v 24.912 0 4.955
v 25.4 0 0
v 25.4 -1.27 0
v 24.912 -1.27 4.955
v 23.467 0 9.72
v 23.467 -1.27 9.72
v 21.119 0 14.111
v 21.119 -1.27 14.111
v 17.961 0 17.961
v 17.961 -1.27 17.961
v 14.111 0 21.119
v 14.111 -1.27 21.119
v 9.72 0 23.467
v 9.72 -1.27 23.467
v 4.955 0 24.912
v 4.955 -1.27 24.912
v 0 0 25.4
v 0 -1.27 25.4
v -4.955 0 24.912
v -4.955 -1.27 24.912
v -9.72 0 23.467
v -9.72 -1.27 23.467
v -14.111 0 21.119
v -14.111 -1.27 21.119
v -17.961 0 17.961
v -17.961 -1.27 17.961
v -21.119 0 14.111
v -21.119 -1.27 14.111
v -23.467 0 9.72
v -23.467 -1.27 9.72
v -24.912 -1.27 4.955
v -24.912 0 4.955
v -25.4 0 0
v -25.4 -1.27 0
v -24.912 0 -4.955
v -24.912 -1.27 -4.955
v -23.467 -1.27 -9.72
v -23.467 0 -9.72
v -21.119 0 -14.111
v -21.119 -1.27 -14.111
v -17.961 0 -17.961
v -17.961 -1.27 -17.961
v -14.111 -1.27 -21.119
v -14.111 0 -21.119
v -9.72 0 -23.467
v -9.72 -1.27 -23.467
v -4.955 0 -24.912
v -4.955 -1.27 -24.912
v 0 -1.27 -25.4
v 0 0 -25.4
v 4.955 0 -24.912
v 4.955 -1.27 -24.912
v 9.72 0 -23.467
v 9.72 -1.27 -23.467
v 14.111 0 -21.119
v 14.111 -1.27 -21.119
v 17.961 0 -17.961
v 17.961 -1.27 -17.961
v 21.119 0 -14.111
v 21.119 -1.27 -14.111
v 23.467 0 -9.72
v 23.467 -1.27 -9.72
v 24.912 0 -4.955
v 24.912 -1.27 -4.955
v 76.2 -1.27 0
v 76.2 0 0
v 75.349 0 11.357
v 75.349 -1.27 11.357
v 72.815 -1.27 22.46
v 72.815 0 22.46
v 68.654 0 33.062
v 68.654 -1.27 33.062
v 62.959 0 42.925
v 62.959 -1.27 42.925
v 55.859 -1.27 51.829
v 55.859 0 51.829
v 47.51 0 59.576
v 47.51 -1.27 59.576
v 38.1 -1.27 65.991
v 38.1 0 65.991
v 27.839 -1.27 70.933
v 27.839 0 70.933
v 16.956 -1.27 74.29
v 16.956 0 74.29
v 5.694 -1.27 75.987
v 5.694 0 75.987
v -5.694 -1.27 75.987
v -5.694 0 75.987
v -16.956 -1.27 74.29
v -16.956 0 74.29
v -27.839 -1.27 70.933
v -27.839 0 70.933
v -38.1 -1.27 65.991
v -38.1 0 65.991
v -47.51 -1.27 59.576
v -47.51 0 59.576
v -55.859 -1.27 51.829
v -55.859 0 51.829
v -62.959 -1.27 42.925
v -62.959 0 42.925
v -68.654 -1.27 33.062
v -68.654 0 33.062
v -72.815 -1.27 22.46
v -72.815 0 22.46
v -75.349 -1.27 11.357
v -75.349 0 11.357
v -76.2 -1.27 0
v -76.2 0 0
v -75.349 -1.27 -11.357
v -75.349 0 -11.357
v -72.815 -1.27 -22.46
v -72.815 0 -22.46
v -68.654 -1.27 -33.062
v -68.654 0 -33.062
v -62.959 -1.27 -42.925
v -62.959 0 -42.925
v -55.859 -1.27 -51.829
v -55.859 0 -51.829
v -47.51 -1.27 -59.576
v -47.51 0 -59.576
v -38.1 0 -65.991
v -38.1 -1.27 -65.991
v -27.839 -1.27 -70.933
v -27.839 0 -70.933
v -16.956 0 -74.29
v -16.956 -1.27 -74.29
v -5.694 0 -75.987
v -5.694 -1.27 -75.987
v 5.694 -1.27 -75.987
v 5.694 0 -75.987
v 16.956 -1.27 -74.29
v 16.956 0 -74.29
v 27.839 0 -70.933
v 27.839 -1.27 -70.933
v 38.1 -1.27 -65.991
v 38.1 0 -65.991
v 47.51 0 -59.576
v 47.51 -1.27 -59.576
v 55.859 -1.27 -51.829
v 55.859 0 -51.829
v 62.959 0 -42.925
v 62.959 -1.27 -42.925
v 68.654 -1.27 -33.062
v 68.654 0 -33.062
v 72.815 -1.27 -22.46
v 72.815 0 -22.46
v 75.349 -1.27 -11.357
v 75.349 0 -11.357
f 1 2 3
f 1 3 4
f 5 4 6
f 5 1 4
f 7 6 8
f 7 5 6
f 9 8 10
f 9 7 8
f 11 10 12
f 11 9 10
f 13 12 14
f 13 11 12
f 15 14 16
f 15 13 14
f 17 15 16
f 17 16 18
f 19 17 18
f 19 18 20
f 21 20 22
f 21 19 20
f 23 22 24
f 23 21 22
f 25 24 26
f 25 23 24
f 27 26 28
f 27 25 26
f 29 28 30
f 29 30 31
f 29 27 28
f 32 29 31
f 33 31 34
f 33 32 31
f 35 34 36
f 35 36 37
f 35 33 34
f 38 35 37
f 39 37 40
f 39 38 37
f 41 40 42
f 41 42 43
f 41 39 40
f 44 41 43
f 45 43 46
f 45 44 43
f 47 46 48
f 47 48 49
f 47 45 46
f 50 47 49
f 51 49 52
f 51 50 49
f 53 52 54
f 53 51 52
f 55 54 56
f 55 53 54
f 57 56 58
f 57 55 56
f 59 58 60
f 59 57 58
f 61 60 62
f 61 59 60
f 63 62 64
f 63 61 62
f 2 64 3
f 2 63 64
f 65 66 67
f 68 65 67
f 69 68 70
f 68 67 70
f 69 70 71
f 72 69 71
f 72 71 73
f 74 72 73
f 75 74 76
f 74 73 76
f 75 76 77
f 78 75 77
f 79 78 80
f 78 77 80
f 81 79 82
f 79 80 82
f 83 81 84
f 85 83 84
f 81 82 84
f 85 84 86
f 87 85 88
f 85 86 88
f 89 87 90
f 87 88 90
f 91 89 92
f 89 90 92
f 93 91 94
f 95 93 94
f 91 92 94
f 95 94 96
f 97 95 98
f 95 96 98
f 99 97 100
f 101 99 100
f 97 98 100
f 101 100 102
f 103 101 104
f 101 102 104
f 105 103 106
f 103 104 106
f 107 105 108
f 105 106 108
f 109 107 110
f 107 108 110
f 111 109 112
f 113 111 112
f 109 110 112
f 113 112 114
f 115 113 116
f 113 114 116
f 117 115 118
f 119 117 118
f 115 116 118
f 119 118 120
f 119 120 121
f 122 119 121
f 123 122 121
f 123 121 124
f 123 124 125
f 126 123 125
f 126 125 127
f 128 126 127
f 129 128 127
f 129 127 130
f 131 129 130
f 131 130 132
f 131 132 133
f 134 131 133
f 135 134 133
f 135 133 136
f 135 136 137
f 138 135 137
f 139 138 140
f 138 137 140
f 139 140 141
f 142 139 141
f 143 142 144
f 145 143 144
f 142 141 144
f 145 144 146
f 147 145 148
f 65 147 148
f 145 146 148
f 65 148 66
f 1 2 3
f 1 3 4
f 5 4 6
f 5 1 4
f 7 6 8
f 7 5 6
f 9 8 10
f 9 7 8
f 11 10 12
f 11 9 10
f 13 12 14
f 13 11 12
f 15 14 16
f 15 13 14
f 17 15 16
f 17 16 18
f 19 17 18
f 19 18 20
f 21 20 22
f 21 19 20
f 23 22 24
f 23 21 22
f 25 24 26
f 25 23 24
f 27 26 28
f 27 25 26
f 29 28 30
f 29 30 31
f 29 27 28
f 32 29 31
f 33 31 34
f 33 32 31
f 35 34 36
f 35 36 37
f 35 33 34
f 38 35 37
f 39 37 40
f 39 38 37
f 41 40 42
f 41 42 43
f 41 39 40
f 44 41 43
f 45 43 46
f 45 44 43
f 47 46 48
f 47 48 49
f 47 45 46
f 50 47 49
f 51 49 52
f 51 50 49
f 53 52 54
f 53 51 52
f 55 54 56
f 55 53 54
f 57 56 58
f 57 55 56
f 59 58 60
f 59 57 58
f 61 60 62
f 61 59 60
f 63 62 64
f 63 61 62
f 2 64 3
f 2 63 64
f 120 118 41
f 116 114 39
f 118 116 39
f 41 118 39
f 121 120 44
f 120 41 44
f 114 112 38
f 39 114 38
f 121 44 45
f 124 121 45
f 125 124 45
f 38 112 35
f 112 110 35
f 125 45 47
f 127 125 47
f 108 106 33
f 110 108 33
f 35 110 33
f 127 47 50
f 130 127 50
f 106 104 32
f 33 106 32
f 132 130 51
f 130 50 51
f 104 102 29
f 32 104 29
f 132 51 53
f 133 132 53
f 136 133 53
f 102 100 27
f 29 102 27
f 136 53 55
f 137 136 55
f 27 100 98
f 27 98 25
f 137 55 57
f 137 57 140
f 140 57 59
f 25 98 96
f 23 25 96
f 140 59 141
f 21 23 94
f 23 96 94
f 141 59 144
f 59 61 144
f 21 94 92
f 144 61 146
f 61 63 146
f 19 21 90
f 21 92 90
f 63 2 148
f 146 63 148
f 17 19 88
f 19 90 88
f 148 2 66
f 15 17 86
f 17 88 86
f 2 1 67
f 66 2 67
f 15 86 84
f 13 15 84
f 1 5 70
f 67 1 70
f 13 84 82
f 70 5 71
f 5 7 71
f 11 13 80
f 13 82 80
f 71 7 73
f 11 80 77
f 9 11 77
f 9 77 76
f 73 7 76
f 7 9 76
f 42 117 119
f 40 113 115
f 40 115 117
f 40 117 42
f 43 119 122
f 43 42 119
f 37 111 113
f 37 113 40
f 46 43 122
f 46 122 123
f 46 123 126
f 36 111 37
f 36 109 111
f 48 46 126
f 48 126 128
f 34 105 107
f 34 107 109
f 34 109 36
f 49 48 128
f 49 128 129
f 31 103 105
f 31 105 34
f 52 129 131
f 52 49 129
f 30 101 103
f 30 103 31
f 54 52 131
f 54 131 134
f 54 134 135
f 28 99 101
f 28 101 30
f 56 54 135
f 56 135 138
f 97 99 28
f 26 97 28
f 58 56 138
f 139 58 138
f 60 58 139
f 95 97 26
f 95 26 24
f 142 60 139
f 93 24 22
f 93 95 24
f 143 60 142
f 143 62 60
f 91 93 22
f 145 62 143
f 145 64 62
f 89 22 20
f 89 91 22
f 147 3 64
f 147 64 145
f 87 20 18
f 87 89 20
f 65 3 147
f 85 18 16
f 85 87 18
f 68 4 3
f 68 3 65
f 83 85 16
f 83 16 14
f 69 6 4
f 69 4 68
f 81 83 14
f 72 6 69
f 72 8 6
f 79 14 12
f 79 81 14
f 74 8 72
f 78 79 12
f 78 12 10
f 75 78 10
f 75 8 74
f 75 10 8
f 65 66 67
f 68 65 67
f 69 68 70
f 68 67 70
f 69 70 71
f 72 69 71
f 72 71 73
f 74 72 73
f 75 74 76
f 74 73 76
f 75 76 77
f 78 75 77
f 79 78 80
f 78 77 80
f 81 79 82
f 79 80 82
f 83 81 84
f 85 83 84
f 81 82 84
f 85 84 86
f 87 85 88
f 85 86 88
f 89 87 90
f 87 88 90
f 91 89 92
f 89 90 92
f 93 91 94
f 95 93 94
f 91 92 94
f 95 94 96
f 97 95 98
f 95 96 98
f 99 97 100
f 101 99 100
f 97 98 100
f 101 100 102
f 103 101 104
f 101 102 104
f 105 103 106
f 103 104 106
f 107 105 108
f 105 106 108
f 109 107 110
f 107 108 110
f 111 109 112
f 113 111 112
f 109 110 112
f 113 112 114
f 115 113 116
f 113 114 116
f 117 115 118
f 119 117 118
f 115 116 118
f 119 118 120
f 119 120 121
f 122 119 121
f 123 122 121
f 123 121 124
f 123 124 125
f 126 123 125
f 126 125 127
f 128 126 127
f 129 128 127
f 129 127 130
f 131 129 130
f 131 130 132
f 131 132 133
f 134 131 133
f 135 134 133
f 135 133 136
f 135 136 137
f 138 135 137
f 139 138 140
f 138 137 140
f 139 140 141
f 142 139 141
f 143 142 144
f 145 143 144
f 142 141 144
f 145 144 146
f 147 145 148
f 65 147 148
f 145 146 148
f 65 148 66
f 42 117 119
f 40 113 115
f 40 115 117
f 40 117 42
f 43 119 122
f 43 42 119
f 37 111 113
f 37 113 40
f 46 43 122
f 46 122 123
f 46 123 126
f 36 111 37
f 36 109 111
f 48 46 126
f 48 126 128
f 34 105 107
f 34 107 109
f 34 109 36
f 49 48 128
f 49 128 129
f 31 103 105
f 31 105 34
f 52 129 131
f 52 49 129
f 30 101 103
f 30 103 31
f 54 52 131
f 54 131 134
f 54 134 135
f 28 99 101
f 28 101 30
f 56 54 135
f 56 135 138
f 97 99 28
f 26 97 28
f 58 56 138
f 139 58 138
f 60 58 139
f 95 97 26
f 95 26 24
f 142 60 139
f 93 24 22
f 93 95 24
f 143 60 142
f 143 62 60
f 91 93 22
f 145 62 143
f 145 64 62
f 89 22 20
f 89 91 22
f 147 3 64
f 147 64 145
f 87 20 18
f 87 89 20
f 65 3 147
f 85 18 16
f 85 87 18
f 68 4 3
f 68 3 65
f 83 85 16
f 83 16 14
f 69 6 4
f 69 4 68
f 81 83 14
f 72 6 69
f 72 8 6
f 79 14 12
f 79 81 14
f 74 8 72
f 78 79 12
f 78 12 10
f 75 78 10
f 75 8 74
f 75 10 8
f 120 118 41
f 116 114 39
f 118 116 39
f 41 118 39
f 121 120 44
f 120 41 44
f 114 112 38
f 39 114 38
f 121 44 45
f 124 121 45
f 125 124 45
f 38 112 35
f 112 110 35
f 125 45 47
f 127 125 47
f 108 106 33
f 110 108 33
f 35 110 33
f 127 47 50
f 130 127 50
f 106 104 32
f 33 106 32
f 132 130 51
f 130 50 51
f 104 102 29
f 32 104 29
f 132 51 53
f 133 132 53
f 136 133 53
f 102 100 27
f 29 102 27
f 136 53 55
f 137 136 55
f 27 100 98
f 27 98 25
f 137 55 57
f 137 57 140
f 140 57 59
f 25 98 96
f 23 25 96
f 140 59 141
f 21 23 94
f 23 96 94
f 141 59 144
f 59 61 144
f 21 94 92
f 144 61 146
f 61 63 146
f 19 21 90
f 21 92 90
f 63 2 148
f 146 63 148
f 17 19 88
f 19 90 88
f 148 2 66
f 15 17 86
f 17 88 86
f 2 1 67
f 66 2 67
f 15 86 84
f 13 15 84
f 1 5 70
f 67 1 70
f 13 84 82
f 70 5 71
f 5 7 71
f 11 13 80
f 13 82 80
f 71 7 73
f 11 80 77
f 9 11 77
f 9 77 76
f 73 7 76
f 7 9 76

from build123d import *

# Parameters (mm, degrees)
F0_R     = 76.2
F0_R_2   = 25.4
F1_DEPTH = 1.27
F2_DEPTH = 1.27


with BuildPart() as f1:
    # F0 (on Front) → F1 (new body)
    with BuildSketch(Plane.XZ):
        Circle(F0_R)
        Circle(F0_R_2, mode=Mode.SUBTRACT)
    extrude(amount=F1_DEPTH)


with BuildPart() as f2:
    # F0 (on Front) → F2 (new body)
    with BuildSketch(Plane.XZ):
        Circle(F0_R)
        Circle(F0_R_2, mode=Mode.SUBTRACT)
    extrude(amount=F2_DEPTH)


solid = Compound([f1.part, f2.part])
